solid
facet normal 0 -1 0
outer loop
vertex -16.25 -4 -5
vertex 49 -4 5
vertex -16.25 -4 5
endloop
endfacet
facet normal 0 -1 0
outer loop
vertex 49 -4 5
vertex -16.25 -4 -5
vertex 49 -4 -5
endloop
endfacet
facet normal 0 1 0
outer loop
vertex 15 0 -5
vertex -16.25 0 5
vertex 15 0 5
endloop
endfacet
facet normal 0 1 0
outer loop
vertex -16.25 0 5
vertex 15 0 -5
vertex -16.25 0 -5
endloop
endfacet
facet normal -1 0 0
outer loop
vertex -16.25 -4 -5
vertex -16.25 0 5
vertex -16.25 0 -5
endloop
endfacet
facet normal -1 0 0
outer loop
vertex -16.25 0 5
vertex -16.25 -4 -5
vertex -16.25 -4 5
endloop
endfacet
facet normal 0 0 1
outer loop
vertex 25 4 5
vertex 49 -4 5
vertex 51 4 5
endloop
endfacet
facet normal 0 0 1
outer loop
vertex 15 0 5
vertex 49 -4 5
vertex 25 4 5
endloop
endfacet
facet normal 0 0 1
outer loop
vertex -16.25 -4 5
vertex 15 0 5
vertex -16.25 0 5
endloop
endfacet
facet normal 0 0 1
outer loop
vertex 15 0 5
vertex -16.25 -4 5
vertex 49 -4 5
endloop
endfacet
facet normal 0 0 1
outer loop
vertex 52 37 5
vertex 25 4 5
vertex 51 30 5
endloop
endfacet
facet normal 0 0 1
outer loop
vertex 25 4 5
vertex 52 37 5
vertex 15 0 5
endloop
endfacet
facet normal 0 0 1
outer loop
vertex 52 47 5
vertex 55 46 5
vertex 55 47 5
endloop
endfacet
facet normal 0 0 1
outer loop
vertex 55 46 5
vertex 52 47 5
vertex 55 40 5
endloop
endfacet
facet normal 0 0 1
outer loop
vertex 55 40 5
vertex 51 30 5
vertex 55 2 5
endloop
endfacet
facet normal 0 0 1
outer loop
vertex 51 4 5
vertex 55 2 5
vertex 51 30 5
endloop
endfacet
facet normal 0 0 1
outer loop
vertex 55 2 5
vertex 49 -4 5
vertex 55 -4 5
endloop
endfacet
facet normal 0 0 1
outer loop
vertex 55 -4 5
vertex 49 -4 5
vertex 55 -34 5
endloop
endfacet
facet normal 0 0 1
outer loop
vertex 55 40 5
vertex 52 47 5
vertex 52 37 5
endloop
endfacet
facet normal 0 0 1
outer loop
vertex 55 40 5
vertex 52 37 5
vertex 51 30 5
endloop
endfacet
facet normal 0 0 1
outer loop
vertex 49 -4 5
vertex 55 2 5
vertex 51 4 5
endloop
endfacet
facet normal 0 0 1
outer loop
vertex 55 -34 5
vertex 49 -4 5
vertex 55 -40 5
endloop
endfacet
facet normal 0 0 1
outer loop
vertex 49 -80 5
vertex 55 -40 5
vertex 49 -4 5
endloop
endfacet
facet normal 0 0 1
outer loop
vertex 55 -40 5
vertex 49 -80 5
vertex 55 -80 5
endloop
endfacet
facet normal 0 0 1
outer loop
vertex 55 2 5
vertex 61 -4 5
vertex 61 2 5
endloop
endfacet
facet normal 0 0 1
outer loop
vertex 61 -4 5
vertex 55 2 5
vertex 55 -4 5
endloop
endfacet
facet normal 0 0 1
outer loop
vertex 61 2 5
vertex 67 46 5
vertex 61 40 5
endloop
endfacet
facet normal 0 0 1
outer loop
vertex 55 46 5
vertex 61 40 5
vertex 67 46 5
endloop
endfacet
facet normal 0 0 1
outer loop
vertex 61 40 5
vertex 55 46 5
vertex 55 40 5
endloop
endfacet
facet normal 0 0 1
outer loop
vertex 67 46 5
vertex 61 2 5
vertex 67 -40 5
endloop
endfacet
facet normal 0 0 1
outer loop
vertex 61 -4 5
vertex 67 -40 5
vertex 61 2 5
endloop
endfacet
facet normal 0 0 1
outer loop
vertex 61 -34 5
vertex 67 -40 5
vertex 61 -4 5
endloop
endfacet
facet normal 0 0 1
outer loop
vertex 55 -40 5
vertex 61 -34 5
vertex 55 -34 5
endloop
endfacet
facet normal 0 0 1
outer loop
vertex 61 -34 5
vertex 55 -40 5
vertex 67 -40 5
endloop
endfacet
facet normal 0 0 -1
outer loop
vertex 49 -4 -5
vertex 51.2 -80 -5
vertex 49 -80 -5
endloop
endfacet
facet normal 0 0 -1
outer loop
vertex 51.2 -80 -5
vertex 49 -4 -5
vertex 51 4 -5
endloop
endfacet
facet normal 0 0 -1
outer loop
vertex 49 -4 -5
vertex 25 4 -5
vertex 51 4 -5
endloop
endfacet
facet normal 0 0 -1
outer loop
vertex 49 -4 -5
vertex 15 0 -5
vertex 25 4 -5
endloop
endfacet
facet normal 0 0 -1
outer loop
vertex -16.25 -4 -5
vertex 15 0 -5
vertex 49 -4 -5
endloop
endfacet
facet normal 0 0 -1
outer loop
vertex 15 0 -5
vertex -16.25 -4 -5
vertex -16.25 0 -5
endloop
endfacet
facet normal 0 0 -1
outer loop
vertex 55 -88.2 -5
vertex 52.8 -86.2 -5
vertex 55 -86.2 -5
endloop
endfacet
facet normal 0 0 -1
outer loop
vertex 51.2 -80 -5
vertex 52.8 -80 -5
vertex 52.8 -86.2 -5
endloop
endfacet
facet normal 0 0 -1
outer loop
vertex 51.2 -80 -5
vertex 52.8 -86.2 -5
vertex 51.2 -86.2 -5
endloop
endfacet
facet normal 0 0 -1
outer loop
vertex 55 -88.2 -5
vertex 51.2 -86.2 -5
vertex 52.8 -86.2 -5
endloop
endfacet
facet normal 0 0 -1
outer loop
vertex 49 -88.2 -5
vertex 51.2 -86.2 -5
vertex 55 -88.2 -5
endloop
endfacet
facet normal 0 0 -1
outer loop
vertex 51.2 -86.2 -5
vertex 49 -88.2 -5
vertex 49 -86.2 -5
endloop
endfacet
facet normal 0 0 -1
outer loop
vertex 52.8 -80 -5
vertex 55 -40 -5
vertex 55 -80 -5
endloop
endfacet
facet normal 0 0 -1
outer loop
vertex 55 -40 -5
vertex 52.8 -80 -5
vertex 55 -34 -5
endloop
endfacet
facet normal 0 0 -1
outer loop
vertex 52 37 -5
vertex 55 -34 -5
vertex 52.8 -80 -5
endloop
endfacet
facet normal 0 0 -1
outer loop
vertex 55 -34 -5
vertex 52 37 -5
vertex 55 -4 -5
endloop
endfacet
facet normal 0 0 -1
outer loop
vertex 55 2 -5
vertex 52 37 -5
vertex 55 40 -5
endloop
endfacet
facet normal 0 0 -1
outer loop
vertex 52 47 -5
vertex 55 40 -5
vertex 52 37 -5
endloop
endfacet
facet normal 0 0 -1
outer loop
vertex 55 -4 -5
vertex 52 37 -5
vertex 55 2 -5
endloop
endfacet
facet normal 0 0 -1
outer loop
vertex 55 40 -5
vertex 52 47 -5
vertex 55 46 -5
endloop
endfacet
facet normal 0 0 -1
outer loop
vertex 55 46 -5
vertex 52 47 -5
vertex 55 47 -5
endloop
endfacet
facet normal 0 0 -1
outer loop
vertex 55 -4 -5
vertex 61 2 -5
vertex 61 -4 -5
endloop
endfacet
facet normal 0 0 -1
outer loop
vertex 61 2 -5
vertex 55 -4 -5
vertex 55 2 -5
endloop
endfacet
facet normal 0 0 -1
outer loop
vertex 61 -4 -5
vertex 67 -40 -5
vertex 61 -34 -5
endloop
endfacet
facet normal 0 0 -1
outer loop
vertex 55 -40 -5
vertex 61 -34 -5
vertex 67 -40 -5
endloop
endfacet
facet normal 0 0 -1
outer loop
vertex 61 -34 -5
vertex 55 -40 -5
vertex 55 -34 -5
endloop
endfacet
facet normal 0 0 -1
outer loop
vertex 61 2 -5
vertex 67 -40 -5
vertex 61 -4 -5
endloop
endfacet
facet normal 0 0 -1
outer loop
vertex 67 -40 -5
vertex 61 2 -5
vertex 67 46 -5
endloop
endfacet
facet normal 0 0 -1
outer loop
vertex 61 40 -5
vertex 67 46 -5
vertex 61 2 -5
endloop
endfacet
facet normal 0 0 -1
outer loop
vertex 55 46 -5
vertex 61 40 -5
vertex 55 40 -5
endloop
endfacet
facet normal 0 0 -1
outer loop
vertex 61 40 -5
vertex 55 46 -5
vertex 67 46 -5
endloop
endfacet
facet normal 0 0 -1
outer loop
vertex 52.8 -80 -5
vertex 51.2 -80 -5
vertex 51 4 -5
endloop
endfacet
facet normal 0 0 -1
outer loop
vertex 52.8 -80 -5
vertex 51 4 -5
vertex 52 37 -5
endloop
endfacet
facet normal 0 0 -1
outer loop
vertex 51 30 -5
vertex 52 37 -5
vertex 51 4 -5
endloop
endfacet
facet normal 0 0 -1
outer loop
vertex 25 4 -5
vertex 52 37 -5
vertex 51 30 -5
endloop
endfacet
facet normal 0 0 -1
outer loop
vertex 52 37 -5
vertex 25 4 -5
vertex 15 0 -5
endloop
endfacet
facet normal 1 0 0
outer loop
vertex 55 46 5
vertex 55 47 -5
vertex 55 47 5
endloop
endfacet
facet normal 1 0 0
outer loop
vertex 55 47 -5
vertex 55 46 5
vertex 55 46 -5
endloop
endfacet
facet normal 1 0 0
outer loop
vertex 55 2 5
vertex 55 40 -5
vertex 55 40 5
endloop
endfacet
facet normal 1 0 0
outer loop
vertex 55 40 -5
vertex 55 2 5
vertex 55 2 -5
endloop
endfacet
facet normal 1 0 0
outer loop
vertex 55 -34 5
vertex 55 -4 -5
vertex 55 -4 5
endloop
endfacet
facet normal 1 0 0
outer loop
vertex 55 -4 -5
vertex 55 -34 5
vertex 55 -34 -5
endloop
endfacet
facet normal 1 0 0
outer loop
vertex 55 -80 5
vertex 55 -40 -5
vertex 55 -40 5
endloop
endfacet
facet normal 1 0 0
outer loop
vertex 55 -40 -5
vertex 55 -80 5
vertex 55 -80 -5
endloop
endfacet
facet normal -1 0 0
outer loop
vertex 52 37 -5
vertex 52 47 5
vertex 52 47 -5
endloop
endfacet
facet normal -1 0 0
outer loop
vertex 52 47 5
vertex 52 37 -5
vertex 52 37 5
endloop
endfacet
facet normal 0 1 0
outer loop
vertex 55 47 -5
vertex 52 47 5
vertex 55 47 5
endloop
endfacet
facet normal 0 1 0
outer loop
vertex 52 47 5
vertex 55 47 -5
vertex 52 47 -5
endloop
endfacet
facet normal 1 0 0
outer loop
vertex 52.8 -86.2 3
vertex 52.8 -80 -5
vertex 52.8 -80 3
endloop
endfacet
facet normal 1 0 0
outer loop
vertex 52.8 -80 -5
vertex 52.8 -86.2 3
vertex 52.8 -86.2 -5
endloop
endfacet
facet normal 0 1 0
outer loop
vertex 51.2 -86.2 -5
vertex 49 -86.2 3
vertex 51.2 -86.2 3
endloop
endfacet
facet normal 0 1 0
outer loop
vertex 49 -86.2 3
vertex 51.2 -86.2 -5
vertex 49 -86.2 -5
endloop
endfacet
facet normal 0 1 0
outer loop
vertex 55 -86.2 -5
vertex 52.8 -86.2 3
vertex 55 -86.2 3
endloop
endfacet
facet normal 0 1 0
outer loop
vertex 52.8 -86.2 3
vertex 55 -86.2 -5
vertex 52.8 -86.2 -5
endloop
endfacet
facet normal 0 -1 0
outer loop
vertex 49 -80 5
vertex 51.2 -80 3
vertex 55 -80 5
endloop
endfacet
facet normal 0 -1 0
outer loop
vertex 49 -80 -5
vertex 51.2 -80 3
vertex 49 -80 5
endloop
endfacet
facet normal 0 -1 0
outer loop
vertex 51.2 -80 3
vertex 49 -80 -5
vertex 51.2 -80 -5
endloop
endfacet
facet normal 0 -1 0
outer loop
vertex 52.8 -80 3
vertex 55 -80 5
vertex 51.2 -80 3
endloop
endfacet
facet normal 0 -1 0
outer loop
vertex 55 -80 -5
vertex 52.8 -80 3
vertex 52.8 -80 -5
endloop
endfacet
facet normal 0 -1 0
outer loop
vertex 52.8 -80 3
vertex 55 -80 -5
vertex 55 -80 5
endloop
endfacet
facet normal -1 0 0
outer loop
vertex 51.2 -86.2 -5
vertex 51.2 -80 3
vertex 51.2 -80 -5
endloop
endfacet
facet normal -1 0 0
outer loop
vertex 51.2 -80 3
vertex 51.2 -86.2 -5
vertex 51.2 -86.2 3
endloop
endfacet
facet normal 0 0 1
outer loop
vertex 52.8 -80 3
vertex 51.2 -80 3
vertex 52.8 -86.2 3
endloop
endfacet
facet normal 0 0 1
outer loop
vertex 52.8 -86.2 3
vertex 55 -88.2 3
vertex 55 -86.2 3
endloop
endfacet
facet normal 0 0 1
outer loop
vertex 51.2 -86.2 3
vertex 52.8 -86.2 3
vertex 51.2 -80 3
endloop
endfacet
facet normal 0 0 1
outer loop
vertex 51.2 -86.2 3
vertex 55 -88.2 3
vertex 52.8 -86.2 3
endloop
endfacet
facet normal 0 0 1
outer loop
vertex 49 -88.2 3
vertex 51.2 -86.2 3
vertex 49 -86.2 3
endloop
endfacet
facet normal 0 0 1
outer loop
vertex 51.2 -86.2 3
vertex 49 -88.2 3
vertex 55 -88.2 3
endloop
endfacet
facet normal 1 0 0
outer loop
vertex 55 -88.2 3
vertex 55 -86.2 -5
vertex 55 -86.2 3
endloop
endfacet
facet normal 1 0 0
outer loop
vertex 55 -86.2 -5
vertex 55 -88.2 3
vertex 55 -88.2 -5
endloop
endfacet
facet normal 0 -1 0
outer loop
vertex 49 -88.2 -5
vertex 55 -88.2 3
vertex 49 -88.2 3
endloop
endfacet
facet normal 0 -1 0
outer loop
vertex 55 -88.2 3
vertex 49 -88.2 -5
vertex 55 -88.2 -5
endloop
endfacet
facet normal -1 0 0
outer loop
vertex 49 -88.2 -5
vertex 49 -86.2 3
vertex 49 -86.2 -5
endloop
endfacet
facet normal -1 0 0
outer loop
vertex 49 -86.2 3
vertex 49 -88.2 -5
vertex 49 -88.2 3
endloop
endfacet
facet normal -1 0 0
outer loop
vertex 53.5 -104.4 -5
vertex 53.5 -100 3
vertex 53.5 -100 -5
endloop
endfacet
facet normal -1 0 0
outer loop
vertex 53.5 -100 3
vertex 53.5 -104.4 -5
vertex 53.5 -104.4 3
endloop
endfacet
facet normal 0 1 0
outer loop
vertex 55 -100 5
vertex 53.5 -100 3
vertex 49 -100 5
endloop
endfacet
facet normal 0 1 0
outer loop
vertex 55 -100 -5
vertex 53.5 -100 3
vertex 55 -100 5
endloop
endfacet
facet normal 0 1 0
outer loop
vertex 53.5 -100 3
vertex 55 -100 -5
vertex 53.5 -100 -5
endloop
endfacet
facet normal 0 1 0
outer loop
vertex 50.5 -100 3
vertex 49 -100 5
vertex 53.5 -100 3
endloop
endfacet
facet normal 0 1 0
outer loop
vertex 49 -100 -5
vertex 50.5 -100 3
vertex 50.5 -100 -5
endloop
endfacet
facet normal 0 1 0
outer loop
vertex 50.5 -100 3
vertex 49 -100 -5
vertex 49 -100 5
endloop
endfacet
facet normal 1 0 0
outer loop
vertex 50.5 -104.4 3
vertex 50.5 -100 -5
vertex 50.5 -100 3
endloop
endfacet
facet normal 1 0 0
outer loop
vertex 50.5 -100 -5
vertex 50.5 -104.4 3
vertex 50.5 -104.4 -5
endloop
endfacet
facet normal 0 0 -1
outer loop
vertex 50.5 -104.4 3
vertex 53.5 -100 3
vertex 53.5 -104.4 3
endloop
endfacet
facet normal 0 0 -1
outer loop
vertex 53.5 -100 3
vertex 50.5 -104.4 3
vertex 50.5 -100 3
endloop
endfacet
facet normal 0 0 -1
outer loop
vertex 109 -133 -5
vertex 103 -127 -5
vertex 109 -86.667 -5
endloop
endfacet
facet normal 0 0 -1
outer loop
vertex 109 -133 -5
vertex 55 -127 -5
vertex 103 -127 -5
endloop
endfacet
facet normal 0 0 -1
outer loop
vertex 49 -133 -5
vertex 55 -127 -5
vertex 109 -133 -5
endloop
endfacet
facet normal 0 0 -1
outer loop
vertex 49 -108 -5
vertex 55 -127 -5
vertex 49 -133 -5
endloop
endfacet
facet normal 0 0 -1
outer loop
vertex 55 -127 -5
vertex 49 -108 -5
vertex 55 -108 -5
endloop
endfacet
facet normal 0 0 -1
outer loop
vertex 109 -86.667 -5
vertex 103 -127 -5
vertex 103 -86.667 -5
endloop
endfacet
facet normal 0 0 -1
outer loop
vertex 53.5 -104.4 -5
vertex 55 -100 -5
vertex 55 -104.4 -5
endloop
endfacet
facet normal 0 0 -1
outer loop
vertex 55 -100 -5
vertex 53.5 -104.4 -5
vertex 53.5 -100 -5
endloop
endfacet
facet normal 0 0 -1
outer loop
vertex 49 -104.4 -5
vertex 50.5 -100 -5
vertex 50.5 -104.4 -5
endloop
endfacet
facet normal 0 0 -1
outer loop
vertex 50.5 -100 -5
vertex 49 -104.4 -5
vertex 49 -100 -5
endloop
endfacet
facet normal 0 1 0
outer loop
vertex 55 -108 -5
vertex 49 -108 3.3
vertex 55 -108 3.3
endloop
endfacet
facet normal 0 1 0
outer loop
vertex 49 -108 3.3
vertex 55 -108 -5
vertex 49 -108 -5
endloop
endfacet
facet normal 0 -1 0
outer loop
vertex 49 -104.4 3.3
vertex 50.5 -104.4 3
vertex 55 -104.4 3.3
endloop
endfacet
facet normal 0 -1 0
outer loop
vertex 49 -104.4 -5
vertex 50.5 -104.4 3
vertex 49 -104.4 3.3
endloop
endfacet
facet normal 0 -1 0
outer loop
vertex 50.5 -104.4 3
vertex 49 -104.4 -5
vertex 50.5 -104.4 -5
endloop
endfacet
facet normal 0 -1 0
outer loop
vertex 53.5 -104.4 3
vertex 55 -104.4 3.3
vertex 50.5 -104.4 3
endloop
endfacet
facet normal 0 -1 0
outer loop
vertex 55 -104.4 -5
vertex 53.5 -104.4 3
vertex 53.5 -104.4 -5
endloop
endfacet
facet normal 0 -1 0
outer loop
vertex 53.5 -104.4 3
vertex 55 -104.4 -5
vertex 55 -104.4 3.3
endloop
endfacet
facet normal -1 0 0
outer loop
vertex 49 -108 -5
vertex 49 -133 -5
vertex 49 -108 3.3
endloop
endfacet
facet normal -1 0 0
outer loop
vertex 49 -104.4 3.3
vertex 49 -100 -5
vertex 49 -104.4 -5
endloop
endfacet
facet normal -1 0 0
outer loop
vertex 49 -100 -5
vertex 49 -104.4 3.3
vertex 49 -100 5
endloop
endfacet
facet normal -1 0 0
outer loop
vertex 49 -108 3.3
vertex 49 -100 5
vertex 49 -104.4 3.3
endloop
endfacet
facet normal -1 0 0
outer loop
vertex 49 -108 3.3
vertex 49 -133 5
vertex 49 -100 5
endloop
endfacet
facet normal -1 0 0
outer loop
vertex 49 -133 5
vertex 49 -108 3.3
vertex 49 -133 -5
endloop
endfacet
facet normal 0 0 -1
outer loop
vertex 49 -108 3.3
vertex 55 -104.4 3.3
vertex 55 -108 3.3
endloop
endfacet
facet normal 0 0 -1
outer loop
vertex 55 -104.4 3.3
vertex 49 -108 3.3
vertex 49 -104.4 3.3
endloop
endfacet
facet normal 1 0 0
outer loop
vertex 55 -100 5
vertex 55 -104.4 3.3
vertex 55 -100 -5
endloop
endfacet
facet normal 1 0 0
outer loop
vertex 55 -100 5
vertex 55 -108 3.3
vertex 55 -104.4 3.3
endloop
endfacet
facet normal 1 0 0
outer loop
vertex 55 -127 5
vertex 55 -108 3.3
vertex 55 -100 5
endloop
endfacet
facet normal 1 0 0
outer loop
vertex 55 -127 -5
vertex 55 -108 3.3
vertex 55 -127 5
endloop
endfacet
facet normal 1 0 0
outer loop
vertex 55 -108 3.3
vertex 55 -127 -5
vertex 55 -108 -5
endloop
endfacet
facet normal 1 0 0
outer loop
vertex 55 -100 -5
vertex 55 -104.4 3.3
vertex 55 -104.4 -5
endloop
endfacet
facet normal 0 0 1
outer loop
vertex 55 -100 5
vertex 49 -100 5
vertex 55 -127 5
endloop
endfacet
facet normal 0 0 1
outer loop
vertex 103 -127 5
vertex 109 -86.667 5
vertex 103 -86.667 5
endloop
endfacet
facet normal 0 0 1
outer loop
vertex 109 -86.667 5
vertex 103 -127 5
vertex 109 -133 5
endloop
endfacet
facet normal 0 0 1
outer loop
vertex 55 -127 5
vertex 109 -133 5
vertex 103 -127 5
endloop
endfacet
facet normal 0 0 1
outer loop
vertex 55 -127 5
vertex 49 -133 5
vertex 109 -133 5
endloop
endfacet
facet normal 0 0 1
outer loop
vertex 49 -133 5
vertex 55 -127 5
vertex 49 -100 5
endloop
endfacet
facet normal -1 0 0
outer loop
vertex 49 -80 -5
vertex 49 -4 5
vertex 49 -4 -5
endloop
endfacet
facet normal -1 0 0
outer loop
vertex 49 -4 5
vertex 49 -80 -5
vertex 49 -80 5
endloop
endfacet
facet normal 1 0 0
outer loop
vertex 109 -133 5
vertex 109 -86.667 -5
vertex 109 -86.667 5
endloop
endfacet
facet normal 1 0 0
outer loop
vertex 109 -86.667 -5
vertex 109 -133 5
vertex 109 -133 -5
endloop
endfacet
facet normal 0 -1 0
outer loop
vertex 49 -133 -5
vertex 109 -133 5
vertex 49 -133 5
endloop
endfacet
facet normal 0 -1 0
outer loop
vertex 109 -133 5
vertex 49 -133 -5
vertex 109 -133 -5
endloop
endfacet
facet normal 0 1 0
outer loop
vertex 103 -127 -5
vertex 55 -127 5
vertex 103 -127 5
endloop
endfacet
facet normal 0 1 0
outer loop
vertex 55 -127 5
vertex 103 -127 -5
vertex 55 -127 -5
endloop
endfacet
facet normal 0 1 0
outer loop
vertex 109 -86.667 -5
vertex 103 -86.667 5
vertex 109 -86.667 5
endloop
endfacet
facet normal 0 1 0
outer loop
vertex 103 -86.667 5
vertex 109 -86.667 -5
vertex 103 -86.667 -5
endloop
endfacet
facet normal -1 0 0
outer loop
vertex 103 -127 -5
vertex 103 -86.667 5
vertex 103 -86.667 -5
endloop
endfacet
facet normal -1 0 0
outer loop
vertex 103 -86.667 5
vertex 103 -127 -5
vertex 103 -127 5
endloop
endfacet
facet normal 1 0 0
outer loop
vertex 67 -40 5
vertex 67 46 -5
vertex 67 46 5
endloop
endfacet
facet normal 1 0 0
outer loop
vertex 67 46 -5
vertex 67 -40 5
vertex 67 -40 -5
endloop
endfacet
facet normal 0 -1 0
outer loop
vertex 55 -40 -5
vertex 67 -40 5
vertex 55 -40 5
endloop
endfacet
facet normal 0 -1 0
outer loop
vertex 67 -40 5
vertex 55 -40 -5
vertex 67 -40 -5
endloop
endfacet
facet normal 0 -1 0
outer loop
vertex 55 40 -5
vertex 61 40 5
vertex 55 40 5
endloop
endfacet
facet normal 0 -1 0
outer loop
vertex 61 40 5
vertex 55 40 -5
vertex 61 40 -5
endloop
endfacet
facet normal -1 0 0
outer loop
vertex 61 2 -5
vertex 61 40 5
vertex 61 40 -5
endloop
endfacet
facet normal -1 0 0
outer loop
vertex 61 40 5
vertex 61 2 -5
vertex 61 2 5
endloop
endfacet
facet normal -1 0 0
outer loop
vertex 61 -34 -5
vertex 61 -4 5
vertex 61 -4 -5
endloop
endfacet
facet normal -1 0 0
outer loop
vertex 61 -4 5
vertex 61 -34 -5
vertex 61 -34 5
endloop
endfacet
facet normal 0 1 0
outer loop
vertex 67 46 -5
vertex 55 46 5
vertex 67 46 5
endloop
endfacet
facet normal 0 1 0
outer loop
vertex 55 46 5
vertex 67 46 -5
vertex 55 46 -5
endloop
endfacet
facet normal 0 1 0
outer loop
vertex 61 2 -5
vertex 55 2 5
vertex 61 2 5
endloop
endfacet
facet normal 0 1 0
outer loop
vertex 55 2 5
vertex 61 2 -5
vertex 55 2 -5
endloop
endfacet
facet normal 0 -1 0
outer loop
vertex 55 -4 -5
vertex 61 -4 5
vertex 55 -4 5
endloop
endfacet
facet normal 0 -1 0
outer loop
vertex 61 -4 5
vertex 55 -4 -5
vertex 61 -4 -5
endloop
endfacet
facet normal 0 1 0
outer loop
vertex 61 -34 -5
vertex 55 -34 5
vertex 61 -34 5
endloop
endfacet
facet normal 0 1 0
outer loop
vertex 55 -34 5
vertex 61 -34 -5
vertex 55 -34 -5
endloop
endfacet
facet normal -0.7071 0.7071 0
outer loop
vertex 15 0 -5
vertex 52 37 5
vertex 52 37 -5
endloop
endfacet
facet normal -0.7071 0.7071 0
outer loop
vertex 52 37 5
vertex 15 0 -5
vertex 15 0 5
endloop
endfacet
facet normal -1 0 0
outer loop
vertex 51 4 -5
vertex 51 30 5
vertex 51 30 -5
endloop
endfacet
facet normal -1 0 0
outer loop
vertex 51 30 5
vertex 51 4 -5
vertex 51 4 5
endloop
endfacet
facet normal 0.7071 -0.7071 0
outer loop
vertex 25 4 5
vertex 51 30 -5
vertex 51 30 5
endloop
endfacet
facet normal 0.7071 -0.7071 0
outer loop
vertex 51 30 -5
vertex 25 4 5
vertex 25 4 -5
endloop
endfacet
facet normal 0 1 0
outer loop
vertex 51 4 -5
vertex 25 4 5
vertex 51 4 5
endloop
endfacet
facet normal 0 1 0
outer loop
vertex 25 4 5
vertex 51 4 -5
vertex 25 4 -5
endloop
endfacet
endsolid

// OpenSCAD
// monitor_shelf
// Thing that lets you place small items on the top edge of your
// computer monitor
//
// Rick Rofail
// rick.rofail at gmail.com
// Distributed under GPL version 2
// <http://www.gnu.org/licenses/gpl-2.0.html>
//
// Designed to use customizer at thingiverse
// <http://www.makerbot.com/blog/2013/01/23/openscad-design-tips-how-to-make-a-customizable-thing/>
// INCLUDING LEGOBRICK MODULES FROM 
// building Lego bricks - rdavis.bacs@gmail.com
// measurements taken from: 
//   http://www.robertcailliau.eu/Lego/Dimensions/zMeasurements-en.xhtml
// all copyrights and designs are property of their respective owners.

// K272HL 
//monitor_thickness = 24;
//shelf_depth = 44;
//front_length = 7.5;
//back_length = 20;


// HP LP2465 - 
//monitor_thickness = 49;
//shelf_depth = 65;
//back_length = 17.2;
//front_length = 17.2;

// XG270HU - 
//monitor_thickness = 19.5;
//shelf_depth = 50;
//back_length = 20;
//front_length = 6;


// Generate just a narrow test profile to ensure it fits your monitor
test_profile = 0; // [0: Full width, 1: Test profile]

include_connector = 1; // [0: No connectors, 1: Use Connectors]
// Thickness of the plastic in mm
thickness = 3.0;  // thickness

// Thickness of monitor at top edge (mm)
monitor_thickness = 52;

// Depth of the perch shelf (mm).
shelf_depth = 65;

// Thickness of the perch shelf (mm).
shelf_thickness = 4;


// Length of front leg
front_length = 0;

// Length of back leg
back_length = 50;

// Monitor back wedge (degrees: 0 means back is perp. to top edge, >0 means it is slanted)
monitor_back_slope = 0;

// Monitor top wedge (degrees: >0 means that the top slopes way instead of being perpendicular to the screen)
monitor_top_wedge = 0;

// Width of the perch shelf (mm).
shelf_width = 10;

//Size of the shelf lip bead. Default 1.2 for a small lip.
shelf_lip_size = 0;

//Depth of the hook size - mine is 48 mm
hook_depth=48;

//Hieight of the hook - dropping it 40 mm below top 
hook_height=130;

// Radius of bead along joints
bead = shelf_lip_size * thickness;

// epsilon to prevent problems with coincident planes
eps = 0.01;

// LEGO settings
/////////
h_pitch = 8.0;   // horizontal unit
v_pitch = 9.6;   // vertical unit
tol = 0.1;       // "play" in x and y directions
k_dia = 4.8;     // knob diameter
k_height = 1.8;  // knob height
k_n = 40;         // knob resolution
wall = 1.2;      // wall thickness

brick_cyl_ex = 8*sqrt(2)-2*2.4;
brick_cyl_in = 4.8;
beam_cyl = 3.0;

module Perch() // Top level module
{
    rotate([90,0,0]) union() {
        // Front is in the xy plane
//        translate([-bead*0.72,0,bead*0.72]) rotate([90,0,0]) cylinder(h=shelf_width-eps,r=bead,center=true); //front bead
        translate([-(shelf_depth/4.8),0,bead+thickness])rotate([90,0,0]) cylinder(h=shelf_width-eps,r=bead,center=true); //front bead

        translate([-thickness,-shelf_width/2,-front_length+eps]) cube([thickness, shelf_width, front_length]); //front riser
        rotate([0,monitor_top_wedge,0]) {
            union(){
                translate([-shelf_depth/4,-shelf_width/2,0]) cube([shelf_depth+ 2*thickness, shelf_width, shelf_thickness]); //top plane
                 
                translate([monitor_thickness+thickness,-shelf_width/2,thickness]) //back riser
                    rotate([0,180-monitor_back_slope-monitor_top_wedge,0])
                        cube([thickness,shelf_width,back_length]); //back riser
                translate([shelf_depth+thickness-(shelf_depth/4),(shelf_width-eps)/2,bead+thickness])
                    rotate([90,0,0]) cylinder(h=shelf_width-eps,r=bead,center=false);
            }
        }
     translate([55,0,0])rotate([90,180,0]) linear_extrude(height = shelf_width, center = true, convexity = 10, twist = 0)
polygon(points=[[0,0],[40,0],[0,40],[4,4],[30,4],[4,30]], paths=[[0,1,2],[3,4,5]]);   
      //hook section for shower door  
      translate([49,-shelf_width/2,0])rotate([0,0,0]) union() {
          translate([0,0,0])cube([thickness*2, shelf_width, hook_height-50]); //back riser for hook - bottom platform section
          translate([2.2,0,80]) {
              translate([0,0,0]) cube([thickness*2-4.4, shelf_width-2, 6.2]); //-male rod
              translate([-2.2,0,6.2]) cube([thickness*2, shelf_width-2, 2]); //-male - cross piece
          }// cube([thickness*2-4, shelf_width-2, 5]); //back riser for hook - bottom platform section-male
          difference() {
              translate([0,0,100])cube([thickness*2, shelf_width, hook_height-100]); //back riser for hook - top hook section
              translate([1.5,0,100]) { // cube([thickness*2-3, shelf_width-1.5, 6]); //back riser for hook - top hook section-FEmale
                translate([0,0,0]) cube([thickness*2-3, shelf_width-2, 7.2]); //-female rod
                translate([-1.5,0,4.4]) cube([thickness*2+2, shelf_width-1.7, 3.6]); //-female - cross piece
               }
          }
          translate([0,0,hook_height-thickness])cube([hook_depth+thickness*2+thickness*2, shelf_width, thickness*2]); //back riser for hook
          translate([hook_depth+thickness+thickness,0,hook_height-hook_height/3])    cube([thickness*2, shelf_width, hook_height/3]); //back riser for hook

      }
     //add back support rods - 12mm
      translate([61,-shelf_width/2,-40])rotate([0,0,0]) union() {
          cube([thickness*2, shelf_width, 80]);
          translate([-6,0,0]) rotate([0,90,00]) cube([thickness*2, shelf_width, 12]);
          translate([-6,0,44]) rotate([0,90,00]) cube([thickness*2, shelf_width, 12]);
          translate([-6,0,80]) rotate([0,90,00]) cube([thickness*2, shelf_width, 12]);
      }
    }
}

module Rod(leng) //rod module
{
    union() {
        difference() {
                    cube([thickness*2, shelf_width, leng]);
                    femaleConnector();
                }
                 translate([0,0,leng]) {
                     maleConnector();
                 }
            }
}

module Profile()
{
    intersection() {
        Perch();
        cube([1000,1000,2],center=true);
    }
}
// Rotate it so that ends up on the printer bed in the right orientation

module maleConnector() 
{
    translate([2.2,0,0]) cube([thickness*2-4.4, shelf_width-2, 6.2]); //-male rod
    translate([0,0,6.2]) cube([thickness*2, shelf_width-2, 1]); //-male - cross piece
}

module femaleConnector() 
{ //be sure to take this as the difference
    translate([1.5,0,0]) cube([thickness*2-3, shelf_width-2, 7.2]); //-female rod
    translate([0,0,4.4]) cube([thickness*2+2, shelf_width-1.7, 3.6]); //-female - cross piece
}



if (test_profile == 1) {
    Profile();
} else {
    
    Perch();
}
